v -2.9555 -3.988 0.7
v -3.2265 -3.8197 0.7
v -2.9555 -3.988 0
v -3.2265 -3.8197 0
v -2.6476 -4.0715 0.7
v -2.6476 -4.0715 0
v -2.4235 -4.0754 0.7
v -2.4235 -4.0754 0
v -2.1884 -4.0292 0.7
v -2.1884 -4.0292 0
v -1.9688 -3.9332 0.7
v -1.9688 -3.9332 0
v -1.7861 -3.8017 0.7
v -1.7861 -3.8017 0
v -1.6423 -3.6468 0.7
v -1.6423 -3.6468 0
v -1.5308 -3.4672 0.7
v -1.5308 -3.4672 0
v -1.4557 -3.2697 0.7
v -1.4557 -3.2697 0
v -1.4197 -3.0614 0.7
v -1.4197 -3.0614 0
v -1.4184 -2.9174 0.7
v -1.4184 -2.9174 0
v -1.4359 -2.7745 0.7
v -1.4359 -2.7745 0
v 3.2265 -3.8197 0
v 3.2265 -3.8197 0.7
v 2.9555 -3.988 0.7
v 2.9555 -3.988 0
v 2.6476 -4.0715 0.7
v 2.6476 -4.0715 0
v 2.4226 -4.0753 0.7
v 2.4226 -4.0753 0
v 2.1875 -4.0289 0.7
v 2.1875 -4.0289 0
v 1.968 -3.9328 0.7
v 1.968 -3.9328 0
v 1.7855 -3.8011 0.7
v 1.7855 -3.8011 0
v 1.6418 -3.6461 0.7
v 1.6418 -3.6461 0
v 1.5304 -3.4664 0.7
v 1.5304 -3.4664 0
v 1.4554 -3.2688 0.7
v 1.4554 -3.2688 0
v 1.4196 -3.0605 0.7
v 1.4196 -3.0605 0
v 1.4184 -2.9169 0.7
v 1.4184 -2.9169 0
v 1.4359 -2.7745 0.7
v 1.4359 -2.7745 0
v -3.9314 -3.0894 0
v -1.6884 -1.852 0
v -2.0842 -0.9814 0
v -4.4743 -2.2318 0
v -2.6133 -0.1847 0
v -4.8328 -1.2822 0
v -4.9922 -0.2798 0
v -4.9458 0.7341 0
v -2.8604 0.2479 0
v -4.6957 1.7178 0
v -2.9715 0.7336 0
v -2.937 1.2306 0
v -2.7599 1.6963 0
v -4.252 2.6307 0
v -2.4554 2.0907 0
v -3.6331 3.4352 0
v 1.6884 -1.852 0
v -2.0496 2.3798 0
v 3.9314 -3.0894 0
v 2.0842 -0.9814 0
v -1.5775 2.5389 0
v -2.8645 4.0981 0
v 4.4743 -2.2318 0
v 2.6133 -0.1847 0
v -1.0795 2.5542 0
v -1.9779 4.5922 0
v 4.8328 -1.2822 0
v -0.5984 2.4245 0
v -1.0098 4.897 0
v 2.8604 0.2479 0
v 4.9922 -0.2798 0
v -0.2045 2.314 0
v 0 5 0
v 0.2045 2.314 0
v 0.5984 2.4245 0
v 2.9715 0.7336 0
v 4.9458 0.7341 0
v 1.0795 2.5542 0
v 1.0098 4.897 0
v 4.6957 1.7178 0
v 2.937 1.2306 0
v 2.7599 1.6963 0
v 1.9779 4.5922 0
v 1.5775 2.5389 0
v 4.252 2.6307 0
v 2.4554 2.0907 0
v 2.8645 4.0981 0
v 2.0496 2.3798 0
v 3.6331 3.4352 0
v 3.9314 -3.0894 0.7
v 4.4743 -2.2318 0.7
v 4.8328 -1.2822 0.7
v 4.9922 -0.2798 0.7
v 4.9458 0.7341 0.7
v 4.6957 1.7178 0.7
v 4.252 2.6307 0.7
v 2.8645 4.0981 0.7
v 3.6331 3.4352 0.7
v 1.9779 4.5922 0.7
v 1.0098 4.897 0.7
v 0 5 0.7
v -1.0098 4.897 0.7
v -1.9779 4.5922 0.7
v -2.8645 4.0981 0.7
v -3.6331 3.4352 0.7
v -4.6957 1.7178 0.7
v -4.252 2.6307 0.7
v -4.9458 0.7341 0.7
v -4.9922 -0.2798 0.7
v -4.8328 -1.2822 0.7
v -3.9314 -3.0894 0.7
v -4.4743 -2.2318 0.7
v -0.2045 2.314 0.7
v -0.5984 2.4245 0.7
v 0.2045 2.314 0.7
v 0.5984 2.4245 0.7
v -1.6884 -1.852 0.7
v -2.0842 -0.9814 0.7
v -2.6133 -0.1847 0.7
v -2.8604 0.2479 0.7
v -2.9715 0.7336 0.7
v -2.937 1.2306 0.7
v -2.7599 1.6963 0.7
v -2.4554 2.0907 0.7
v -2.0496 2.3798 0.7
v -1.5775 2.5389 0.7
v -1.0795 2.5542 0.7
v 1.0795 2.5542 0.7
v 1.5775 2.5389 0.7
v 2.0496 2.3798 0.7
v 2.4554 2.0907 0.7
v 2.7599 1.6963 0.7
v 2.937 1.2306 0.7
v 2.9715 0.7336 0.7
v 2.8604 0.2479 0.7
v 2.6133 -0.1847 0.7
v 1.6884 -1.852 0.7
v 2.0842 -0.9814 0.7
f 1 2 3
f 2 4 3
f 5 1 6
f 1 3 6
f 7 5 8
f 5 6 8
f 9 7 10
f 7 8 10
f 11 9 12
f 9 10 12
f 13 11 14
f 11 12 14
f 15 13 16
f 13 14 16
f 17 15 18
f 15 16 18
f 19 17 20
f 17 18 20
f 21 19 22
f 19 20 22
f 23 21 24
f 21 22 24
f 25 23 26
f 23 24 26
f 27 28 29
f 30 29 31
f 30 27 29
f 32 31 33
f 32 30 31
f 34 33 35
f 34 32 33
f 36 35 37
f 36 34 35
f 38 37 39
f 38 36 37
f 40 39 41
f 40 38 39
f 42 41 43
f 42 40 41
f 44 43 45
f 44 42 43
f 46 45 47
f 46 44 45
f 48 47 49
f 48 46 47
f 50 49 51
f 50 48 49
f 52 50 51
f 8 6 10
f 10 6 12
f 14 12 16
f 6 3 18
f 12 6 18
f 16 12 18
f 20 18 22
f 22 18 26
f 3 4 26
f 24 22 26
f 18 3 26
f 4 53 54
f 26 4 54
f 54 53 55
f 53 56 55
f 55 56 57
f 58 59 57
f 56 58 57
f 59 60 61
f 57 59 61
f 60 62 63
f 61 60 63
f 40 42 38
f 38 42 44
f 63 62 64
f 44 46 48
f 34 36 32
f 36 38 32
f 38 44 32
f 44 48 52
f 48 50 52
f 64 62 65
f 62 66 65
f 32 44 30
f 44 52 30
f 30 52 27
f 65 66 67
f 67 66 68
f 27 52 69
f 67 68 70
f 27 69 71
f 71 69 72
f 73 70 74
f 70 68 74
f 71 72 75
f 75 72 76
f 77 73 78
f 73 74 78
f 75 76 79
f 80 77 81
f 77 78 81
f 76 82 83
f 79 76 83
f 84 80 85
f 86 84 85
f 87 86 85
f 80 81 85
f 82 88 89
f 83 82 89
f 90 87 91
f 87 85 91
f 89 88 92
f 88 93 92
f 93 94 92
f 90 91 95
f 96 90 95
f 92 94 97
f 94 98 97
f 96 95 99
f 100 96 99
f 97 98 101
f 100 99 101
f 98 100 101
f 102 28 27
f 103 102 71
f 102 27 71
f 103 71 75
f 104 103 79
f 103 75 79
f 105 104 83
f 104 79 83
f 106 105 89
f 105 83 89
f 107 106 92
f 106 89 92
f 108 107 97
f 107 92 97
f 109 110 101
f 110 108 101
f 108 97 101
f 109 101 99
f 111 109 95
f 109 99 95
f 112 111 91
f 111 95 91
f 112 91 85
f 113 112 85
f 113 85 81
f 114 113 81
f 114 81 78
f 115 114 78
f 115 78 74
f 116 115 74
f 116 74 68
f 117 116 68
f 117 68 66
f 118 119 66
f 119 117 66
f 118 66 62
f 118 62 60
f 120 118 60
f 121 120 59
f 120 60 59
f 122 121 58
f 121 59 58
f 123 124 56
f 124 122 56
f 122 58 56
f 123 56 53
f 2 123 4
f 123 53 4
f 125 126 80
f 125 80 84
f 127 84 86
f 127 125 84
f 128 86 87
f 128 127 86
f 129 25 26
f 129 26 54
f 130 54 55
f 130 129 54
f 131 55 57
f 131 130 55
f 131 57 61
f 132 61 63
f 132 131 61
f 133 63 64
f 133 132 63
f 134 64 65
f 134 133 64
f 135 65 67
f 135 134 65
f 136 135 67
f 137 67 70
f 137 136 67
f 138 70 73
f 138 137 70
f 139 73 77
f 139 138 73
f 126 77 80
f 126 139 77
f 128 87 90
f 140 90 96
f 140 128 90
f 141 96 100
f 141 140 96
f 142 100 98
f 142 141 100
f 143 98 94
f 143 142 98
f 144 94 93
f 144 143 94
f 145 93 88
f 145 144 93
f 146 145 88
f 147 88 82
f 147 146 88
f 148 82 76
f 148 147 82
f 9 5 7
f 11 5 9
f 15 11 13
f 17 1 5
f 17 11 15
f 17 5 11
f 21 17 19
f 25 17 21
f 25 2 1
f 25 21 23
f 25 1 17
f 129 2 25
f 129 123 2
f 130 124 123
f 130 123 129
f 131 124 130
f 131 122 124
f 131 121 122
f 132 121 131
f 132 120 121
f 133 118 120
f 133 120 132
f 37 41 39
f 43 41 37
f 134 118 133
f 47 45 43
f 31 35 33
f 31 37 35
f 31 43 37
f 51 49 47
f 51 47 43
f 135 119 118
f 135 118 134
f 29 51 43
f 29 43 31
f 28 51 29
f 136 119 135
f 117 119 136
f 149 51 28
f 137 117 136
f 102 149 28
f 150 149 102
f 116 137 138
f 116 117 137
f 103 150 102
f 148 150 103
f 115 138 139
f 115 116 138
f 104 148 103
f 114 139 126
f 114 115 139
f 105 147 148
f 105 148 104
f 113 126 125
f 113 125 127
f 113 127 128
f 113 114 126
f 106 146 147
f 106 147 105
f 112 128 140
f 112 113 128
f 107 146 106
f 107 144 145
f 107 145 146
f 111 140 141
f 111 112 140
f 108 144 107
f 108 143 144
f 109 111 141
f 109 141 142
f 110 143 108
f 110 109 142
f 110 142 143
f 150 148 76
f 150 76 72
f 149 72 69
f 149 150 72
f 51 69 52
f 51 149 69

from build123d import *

# Parameters (mm, degrees)
CROQUIS1_R              = 5
SALIENTE_EXTRUIR1_DEPTH = 0.7
CORTAR_EXTRUIR1_REACH   = 2.7
REDONDEO1_R             = 1.1


with BuildPart() as part:
    # Croquis1 → Saliente-Extruir1 (new body)
    with BuildSketch(Plane.XY):
        Circle(CROQUIS1_R)
    extrude(amount=SALIENTE_EXTRUIR1_DEPTH)

    # Croquis2 → Cortar-Extruir1 (cut, up to next)
    with BuildSketch(Plane.XY.offset(0.7), mode=Mode.PRIVATE) as cortar_extruir1_sk1:
        with BuildLine():
            ThreePointArc((-0.598421585, 2.424539493), (0, 2.3), (0.598421585, 2.424539493))
            ThreePointArc((0.598421585, 2.424539493), (2.622160983, 1.904699976), (2.61328938, -0.184719936))
            ThreePointArc((2.61328938, -0.184719936), (1.528064828, -2.366548348), (1.4, -4.8))
            ThreePointArc((1.4, -4.8), (0, -5), (-1.4, -4.8))
            ThreePointArc((-1.4, -4.8), (-1.528064828, -2.366548348), (-2.61328938, -0.184719936))
            ThreePointArc((-2.61328938, -0.184719936), (-2.622160983, 1.904699976), (-0.598421585, 2.424539493))
        make_face()
    cortar_extruir1_tool1 = extrude(cortar_extruir1_sk1.sketch, amount=-CORTAR_EXTRUIR1_REACH, mode=Mode.PRIVATE) & part.part
    add(cortar_extruir1_tool1.solids().sort_by_distance((0, -0.660031, 0.7))[0], mode=Mode.SUBTRACT)

    # Redondeo1
    redondeo1_edges = [part.edges().sort_by_distance(p)[0] for p in [
        (1.4, -4.8, 0.35),
        (-1.4, -4.8, 0.35),
    ]]
    fillet(redondeo1_edges, radius=REDONDEO1_R)


solid = part.part
